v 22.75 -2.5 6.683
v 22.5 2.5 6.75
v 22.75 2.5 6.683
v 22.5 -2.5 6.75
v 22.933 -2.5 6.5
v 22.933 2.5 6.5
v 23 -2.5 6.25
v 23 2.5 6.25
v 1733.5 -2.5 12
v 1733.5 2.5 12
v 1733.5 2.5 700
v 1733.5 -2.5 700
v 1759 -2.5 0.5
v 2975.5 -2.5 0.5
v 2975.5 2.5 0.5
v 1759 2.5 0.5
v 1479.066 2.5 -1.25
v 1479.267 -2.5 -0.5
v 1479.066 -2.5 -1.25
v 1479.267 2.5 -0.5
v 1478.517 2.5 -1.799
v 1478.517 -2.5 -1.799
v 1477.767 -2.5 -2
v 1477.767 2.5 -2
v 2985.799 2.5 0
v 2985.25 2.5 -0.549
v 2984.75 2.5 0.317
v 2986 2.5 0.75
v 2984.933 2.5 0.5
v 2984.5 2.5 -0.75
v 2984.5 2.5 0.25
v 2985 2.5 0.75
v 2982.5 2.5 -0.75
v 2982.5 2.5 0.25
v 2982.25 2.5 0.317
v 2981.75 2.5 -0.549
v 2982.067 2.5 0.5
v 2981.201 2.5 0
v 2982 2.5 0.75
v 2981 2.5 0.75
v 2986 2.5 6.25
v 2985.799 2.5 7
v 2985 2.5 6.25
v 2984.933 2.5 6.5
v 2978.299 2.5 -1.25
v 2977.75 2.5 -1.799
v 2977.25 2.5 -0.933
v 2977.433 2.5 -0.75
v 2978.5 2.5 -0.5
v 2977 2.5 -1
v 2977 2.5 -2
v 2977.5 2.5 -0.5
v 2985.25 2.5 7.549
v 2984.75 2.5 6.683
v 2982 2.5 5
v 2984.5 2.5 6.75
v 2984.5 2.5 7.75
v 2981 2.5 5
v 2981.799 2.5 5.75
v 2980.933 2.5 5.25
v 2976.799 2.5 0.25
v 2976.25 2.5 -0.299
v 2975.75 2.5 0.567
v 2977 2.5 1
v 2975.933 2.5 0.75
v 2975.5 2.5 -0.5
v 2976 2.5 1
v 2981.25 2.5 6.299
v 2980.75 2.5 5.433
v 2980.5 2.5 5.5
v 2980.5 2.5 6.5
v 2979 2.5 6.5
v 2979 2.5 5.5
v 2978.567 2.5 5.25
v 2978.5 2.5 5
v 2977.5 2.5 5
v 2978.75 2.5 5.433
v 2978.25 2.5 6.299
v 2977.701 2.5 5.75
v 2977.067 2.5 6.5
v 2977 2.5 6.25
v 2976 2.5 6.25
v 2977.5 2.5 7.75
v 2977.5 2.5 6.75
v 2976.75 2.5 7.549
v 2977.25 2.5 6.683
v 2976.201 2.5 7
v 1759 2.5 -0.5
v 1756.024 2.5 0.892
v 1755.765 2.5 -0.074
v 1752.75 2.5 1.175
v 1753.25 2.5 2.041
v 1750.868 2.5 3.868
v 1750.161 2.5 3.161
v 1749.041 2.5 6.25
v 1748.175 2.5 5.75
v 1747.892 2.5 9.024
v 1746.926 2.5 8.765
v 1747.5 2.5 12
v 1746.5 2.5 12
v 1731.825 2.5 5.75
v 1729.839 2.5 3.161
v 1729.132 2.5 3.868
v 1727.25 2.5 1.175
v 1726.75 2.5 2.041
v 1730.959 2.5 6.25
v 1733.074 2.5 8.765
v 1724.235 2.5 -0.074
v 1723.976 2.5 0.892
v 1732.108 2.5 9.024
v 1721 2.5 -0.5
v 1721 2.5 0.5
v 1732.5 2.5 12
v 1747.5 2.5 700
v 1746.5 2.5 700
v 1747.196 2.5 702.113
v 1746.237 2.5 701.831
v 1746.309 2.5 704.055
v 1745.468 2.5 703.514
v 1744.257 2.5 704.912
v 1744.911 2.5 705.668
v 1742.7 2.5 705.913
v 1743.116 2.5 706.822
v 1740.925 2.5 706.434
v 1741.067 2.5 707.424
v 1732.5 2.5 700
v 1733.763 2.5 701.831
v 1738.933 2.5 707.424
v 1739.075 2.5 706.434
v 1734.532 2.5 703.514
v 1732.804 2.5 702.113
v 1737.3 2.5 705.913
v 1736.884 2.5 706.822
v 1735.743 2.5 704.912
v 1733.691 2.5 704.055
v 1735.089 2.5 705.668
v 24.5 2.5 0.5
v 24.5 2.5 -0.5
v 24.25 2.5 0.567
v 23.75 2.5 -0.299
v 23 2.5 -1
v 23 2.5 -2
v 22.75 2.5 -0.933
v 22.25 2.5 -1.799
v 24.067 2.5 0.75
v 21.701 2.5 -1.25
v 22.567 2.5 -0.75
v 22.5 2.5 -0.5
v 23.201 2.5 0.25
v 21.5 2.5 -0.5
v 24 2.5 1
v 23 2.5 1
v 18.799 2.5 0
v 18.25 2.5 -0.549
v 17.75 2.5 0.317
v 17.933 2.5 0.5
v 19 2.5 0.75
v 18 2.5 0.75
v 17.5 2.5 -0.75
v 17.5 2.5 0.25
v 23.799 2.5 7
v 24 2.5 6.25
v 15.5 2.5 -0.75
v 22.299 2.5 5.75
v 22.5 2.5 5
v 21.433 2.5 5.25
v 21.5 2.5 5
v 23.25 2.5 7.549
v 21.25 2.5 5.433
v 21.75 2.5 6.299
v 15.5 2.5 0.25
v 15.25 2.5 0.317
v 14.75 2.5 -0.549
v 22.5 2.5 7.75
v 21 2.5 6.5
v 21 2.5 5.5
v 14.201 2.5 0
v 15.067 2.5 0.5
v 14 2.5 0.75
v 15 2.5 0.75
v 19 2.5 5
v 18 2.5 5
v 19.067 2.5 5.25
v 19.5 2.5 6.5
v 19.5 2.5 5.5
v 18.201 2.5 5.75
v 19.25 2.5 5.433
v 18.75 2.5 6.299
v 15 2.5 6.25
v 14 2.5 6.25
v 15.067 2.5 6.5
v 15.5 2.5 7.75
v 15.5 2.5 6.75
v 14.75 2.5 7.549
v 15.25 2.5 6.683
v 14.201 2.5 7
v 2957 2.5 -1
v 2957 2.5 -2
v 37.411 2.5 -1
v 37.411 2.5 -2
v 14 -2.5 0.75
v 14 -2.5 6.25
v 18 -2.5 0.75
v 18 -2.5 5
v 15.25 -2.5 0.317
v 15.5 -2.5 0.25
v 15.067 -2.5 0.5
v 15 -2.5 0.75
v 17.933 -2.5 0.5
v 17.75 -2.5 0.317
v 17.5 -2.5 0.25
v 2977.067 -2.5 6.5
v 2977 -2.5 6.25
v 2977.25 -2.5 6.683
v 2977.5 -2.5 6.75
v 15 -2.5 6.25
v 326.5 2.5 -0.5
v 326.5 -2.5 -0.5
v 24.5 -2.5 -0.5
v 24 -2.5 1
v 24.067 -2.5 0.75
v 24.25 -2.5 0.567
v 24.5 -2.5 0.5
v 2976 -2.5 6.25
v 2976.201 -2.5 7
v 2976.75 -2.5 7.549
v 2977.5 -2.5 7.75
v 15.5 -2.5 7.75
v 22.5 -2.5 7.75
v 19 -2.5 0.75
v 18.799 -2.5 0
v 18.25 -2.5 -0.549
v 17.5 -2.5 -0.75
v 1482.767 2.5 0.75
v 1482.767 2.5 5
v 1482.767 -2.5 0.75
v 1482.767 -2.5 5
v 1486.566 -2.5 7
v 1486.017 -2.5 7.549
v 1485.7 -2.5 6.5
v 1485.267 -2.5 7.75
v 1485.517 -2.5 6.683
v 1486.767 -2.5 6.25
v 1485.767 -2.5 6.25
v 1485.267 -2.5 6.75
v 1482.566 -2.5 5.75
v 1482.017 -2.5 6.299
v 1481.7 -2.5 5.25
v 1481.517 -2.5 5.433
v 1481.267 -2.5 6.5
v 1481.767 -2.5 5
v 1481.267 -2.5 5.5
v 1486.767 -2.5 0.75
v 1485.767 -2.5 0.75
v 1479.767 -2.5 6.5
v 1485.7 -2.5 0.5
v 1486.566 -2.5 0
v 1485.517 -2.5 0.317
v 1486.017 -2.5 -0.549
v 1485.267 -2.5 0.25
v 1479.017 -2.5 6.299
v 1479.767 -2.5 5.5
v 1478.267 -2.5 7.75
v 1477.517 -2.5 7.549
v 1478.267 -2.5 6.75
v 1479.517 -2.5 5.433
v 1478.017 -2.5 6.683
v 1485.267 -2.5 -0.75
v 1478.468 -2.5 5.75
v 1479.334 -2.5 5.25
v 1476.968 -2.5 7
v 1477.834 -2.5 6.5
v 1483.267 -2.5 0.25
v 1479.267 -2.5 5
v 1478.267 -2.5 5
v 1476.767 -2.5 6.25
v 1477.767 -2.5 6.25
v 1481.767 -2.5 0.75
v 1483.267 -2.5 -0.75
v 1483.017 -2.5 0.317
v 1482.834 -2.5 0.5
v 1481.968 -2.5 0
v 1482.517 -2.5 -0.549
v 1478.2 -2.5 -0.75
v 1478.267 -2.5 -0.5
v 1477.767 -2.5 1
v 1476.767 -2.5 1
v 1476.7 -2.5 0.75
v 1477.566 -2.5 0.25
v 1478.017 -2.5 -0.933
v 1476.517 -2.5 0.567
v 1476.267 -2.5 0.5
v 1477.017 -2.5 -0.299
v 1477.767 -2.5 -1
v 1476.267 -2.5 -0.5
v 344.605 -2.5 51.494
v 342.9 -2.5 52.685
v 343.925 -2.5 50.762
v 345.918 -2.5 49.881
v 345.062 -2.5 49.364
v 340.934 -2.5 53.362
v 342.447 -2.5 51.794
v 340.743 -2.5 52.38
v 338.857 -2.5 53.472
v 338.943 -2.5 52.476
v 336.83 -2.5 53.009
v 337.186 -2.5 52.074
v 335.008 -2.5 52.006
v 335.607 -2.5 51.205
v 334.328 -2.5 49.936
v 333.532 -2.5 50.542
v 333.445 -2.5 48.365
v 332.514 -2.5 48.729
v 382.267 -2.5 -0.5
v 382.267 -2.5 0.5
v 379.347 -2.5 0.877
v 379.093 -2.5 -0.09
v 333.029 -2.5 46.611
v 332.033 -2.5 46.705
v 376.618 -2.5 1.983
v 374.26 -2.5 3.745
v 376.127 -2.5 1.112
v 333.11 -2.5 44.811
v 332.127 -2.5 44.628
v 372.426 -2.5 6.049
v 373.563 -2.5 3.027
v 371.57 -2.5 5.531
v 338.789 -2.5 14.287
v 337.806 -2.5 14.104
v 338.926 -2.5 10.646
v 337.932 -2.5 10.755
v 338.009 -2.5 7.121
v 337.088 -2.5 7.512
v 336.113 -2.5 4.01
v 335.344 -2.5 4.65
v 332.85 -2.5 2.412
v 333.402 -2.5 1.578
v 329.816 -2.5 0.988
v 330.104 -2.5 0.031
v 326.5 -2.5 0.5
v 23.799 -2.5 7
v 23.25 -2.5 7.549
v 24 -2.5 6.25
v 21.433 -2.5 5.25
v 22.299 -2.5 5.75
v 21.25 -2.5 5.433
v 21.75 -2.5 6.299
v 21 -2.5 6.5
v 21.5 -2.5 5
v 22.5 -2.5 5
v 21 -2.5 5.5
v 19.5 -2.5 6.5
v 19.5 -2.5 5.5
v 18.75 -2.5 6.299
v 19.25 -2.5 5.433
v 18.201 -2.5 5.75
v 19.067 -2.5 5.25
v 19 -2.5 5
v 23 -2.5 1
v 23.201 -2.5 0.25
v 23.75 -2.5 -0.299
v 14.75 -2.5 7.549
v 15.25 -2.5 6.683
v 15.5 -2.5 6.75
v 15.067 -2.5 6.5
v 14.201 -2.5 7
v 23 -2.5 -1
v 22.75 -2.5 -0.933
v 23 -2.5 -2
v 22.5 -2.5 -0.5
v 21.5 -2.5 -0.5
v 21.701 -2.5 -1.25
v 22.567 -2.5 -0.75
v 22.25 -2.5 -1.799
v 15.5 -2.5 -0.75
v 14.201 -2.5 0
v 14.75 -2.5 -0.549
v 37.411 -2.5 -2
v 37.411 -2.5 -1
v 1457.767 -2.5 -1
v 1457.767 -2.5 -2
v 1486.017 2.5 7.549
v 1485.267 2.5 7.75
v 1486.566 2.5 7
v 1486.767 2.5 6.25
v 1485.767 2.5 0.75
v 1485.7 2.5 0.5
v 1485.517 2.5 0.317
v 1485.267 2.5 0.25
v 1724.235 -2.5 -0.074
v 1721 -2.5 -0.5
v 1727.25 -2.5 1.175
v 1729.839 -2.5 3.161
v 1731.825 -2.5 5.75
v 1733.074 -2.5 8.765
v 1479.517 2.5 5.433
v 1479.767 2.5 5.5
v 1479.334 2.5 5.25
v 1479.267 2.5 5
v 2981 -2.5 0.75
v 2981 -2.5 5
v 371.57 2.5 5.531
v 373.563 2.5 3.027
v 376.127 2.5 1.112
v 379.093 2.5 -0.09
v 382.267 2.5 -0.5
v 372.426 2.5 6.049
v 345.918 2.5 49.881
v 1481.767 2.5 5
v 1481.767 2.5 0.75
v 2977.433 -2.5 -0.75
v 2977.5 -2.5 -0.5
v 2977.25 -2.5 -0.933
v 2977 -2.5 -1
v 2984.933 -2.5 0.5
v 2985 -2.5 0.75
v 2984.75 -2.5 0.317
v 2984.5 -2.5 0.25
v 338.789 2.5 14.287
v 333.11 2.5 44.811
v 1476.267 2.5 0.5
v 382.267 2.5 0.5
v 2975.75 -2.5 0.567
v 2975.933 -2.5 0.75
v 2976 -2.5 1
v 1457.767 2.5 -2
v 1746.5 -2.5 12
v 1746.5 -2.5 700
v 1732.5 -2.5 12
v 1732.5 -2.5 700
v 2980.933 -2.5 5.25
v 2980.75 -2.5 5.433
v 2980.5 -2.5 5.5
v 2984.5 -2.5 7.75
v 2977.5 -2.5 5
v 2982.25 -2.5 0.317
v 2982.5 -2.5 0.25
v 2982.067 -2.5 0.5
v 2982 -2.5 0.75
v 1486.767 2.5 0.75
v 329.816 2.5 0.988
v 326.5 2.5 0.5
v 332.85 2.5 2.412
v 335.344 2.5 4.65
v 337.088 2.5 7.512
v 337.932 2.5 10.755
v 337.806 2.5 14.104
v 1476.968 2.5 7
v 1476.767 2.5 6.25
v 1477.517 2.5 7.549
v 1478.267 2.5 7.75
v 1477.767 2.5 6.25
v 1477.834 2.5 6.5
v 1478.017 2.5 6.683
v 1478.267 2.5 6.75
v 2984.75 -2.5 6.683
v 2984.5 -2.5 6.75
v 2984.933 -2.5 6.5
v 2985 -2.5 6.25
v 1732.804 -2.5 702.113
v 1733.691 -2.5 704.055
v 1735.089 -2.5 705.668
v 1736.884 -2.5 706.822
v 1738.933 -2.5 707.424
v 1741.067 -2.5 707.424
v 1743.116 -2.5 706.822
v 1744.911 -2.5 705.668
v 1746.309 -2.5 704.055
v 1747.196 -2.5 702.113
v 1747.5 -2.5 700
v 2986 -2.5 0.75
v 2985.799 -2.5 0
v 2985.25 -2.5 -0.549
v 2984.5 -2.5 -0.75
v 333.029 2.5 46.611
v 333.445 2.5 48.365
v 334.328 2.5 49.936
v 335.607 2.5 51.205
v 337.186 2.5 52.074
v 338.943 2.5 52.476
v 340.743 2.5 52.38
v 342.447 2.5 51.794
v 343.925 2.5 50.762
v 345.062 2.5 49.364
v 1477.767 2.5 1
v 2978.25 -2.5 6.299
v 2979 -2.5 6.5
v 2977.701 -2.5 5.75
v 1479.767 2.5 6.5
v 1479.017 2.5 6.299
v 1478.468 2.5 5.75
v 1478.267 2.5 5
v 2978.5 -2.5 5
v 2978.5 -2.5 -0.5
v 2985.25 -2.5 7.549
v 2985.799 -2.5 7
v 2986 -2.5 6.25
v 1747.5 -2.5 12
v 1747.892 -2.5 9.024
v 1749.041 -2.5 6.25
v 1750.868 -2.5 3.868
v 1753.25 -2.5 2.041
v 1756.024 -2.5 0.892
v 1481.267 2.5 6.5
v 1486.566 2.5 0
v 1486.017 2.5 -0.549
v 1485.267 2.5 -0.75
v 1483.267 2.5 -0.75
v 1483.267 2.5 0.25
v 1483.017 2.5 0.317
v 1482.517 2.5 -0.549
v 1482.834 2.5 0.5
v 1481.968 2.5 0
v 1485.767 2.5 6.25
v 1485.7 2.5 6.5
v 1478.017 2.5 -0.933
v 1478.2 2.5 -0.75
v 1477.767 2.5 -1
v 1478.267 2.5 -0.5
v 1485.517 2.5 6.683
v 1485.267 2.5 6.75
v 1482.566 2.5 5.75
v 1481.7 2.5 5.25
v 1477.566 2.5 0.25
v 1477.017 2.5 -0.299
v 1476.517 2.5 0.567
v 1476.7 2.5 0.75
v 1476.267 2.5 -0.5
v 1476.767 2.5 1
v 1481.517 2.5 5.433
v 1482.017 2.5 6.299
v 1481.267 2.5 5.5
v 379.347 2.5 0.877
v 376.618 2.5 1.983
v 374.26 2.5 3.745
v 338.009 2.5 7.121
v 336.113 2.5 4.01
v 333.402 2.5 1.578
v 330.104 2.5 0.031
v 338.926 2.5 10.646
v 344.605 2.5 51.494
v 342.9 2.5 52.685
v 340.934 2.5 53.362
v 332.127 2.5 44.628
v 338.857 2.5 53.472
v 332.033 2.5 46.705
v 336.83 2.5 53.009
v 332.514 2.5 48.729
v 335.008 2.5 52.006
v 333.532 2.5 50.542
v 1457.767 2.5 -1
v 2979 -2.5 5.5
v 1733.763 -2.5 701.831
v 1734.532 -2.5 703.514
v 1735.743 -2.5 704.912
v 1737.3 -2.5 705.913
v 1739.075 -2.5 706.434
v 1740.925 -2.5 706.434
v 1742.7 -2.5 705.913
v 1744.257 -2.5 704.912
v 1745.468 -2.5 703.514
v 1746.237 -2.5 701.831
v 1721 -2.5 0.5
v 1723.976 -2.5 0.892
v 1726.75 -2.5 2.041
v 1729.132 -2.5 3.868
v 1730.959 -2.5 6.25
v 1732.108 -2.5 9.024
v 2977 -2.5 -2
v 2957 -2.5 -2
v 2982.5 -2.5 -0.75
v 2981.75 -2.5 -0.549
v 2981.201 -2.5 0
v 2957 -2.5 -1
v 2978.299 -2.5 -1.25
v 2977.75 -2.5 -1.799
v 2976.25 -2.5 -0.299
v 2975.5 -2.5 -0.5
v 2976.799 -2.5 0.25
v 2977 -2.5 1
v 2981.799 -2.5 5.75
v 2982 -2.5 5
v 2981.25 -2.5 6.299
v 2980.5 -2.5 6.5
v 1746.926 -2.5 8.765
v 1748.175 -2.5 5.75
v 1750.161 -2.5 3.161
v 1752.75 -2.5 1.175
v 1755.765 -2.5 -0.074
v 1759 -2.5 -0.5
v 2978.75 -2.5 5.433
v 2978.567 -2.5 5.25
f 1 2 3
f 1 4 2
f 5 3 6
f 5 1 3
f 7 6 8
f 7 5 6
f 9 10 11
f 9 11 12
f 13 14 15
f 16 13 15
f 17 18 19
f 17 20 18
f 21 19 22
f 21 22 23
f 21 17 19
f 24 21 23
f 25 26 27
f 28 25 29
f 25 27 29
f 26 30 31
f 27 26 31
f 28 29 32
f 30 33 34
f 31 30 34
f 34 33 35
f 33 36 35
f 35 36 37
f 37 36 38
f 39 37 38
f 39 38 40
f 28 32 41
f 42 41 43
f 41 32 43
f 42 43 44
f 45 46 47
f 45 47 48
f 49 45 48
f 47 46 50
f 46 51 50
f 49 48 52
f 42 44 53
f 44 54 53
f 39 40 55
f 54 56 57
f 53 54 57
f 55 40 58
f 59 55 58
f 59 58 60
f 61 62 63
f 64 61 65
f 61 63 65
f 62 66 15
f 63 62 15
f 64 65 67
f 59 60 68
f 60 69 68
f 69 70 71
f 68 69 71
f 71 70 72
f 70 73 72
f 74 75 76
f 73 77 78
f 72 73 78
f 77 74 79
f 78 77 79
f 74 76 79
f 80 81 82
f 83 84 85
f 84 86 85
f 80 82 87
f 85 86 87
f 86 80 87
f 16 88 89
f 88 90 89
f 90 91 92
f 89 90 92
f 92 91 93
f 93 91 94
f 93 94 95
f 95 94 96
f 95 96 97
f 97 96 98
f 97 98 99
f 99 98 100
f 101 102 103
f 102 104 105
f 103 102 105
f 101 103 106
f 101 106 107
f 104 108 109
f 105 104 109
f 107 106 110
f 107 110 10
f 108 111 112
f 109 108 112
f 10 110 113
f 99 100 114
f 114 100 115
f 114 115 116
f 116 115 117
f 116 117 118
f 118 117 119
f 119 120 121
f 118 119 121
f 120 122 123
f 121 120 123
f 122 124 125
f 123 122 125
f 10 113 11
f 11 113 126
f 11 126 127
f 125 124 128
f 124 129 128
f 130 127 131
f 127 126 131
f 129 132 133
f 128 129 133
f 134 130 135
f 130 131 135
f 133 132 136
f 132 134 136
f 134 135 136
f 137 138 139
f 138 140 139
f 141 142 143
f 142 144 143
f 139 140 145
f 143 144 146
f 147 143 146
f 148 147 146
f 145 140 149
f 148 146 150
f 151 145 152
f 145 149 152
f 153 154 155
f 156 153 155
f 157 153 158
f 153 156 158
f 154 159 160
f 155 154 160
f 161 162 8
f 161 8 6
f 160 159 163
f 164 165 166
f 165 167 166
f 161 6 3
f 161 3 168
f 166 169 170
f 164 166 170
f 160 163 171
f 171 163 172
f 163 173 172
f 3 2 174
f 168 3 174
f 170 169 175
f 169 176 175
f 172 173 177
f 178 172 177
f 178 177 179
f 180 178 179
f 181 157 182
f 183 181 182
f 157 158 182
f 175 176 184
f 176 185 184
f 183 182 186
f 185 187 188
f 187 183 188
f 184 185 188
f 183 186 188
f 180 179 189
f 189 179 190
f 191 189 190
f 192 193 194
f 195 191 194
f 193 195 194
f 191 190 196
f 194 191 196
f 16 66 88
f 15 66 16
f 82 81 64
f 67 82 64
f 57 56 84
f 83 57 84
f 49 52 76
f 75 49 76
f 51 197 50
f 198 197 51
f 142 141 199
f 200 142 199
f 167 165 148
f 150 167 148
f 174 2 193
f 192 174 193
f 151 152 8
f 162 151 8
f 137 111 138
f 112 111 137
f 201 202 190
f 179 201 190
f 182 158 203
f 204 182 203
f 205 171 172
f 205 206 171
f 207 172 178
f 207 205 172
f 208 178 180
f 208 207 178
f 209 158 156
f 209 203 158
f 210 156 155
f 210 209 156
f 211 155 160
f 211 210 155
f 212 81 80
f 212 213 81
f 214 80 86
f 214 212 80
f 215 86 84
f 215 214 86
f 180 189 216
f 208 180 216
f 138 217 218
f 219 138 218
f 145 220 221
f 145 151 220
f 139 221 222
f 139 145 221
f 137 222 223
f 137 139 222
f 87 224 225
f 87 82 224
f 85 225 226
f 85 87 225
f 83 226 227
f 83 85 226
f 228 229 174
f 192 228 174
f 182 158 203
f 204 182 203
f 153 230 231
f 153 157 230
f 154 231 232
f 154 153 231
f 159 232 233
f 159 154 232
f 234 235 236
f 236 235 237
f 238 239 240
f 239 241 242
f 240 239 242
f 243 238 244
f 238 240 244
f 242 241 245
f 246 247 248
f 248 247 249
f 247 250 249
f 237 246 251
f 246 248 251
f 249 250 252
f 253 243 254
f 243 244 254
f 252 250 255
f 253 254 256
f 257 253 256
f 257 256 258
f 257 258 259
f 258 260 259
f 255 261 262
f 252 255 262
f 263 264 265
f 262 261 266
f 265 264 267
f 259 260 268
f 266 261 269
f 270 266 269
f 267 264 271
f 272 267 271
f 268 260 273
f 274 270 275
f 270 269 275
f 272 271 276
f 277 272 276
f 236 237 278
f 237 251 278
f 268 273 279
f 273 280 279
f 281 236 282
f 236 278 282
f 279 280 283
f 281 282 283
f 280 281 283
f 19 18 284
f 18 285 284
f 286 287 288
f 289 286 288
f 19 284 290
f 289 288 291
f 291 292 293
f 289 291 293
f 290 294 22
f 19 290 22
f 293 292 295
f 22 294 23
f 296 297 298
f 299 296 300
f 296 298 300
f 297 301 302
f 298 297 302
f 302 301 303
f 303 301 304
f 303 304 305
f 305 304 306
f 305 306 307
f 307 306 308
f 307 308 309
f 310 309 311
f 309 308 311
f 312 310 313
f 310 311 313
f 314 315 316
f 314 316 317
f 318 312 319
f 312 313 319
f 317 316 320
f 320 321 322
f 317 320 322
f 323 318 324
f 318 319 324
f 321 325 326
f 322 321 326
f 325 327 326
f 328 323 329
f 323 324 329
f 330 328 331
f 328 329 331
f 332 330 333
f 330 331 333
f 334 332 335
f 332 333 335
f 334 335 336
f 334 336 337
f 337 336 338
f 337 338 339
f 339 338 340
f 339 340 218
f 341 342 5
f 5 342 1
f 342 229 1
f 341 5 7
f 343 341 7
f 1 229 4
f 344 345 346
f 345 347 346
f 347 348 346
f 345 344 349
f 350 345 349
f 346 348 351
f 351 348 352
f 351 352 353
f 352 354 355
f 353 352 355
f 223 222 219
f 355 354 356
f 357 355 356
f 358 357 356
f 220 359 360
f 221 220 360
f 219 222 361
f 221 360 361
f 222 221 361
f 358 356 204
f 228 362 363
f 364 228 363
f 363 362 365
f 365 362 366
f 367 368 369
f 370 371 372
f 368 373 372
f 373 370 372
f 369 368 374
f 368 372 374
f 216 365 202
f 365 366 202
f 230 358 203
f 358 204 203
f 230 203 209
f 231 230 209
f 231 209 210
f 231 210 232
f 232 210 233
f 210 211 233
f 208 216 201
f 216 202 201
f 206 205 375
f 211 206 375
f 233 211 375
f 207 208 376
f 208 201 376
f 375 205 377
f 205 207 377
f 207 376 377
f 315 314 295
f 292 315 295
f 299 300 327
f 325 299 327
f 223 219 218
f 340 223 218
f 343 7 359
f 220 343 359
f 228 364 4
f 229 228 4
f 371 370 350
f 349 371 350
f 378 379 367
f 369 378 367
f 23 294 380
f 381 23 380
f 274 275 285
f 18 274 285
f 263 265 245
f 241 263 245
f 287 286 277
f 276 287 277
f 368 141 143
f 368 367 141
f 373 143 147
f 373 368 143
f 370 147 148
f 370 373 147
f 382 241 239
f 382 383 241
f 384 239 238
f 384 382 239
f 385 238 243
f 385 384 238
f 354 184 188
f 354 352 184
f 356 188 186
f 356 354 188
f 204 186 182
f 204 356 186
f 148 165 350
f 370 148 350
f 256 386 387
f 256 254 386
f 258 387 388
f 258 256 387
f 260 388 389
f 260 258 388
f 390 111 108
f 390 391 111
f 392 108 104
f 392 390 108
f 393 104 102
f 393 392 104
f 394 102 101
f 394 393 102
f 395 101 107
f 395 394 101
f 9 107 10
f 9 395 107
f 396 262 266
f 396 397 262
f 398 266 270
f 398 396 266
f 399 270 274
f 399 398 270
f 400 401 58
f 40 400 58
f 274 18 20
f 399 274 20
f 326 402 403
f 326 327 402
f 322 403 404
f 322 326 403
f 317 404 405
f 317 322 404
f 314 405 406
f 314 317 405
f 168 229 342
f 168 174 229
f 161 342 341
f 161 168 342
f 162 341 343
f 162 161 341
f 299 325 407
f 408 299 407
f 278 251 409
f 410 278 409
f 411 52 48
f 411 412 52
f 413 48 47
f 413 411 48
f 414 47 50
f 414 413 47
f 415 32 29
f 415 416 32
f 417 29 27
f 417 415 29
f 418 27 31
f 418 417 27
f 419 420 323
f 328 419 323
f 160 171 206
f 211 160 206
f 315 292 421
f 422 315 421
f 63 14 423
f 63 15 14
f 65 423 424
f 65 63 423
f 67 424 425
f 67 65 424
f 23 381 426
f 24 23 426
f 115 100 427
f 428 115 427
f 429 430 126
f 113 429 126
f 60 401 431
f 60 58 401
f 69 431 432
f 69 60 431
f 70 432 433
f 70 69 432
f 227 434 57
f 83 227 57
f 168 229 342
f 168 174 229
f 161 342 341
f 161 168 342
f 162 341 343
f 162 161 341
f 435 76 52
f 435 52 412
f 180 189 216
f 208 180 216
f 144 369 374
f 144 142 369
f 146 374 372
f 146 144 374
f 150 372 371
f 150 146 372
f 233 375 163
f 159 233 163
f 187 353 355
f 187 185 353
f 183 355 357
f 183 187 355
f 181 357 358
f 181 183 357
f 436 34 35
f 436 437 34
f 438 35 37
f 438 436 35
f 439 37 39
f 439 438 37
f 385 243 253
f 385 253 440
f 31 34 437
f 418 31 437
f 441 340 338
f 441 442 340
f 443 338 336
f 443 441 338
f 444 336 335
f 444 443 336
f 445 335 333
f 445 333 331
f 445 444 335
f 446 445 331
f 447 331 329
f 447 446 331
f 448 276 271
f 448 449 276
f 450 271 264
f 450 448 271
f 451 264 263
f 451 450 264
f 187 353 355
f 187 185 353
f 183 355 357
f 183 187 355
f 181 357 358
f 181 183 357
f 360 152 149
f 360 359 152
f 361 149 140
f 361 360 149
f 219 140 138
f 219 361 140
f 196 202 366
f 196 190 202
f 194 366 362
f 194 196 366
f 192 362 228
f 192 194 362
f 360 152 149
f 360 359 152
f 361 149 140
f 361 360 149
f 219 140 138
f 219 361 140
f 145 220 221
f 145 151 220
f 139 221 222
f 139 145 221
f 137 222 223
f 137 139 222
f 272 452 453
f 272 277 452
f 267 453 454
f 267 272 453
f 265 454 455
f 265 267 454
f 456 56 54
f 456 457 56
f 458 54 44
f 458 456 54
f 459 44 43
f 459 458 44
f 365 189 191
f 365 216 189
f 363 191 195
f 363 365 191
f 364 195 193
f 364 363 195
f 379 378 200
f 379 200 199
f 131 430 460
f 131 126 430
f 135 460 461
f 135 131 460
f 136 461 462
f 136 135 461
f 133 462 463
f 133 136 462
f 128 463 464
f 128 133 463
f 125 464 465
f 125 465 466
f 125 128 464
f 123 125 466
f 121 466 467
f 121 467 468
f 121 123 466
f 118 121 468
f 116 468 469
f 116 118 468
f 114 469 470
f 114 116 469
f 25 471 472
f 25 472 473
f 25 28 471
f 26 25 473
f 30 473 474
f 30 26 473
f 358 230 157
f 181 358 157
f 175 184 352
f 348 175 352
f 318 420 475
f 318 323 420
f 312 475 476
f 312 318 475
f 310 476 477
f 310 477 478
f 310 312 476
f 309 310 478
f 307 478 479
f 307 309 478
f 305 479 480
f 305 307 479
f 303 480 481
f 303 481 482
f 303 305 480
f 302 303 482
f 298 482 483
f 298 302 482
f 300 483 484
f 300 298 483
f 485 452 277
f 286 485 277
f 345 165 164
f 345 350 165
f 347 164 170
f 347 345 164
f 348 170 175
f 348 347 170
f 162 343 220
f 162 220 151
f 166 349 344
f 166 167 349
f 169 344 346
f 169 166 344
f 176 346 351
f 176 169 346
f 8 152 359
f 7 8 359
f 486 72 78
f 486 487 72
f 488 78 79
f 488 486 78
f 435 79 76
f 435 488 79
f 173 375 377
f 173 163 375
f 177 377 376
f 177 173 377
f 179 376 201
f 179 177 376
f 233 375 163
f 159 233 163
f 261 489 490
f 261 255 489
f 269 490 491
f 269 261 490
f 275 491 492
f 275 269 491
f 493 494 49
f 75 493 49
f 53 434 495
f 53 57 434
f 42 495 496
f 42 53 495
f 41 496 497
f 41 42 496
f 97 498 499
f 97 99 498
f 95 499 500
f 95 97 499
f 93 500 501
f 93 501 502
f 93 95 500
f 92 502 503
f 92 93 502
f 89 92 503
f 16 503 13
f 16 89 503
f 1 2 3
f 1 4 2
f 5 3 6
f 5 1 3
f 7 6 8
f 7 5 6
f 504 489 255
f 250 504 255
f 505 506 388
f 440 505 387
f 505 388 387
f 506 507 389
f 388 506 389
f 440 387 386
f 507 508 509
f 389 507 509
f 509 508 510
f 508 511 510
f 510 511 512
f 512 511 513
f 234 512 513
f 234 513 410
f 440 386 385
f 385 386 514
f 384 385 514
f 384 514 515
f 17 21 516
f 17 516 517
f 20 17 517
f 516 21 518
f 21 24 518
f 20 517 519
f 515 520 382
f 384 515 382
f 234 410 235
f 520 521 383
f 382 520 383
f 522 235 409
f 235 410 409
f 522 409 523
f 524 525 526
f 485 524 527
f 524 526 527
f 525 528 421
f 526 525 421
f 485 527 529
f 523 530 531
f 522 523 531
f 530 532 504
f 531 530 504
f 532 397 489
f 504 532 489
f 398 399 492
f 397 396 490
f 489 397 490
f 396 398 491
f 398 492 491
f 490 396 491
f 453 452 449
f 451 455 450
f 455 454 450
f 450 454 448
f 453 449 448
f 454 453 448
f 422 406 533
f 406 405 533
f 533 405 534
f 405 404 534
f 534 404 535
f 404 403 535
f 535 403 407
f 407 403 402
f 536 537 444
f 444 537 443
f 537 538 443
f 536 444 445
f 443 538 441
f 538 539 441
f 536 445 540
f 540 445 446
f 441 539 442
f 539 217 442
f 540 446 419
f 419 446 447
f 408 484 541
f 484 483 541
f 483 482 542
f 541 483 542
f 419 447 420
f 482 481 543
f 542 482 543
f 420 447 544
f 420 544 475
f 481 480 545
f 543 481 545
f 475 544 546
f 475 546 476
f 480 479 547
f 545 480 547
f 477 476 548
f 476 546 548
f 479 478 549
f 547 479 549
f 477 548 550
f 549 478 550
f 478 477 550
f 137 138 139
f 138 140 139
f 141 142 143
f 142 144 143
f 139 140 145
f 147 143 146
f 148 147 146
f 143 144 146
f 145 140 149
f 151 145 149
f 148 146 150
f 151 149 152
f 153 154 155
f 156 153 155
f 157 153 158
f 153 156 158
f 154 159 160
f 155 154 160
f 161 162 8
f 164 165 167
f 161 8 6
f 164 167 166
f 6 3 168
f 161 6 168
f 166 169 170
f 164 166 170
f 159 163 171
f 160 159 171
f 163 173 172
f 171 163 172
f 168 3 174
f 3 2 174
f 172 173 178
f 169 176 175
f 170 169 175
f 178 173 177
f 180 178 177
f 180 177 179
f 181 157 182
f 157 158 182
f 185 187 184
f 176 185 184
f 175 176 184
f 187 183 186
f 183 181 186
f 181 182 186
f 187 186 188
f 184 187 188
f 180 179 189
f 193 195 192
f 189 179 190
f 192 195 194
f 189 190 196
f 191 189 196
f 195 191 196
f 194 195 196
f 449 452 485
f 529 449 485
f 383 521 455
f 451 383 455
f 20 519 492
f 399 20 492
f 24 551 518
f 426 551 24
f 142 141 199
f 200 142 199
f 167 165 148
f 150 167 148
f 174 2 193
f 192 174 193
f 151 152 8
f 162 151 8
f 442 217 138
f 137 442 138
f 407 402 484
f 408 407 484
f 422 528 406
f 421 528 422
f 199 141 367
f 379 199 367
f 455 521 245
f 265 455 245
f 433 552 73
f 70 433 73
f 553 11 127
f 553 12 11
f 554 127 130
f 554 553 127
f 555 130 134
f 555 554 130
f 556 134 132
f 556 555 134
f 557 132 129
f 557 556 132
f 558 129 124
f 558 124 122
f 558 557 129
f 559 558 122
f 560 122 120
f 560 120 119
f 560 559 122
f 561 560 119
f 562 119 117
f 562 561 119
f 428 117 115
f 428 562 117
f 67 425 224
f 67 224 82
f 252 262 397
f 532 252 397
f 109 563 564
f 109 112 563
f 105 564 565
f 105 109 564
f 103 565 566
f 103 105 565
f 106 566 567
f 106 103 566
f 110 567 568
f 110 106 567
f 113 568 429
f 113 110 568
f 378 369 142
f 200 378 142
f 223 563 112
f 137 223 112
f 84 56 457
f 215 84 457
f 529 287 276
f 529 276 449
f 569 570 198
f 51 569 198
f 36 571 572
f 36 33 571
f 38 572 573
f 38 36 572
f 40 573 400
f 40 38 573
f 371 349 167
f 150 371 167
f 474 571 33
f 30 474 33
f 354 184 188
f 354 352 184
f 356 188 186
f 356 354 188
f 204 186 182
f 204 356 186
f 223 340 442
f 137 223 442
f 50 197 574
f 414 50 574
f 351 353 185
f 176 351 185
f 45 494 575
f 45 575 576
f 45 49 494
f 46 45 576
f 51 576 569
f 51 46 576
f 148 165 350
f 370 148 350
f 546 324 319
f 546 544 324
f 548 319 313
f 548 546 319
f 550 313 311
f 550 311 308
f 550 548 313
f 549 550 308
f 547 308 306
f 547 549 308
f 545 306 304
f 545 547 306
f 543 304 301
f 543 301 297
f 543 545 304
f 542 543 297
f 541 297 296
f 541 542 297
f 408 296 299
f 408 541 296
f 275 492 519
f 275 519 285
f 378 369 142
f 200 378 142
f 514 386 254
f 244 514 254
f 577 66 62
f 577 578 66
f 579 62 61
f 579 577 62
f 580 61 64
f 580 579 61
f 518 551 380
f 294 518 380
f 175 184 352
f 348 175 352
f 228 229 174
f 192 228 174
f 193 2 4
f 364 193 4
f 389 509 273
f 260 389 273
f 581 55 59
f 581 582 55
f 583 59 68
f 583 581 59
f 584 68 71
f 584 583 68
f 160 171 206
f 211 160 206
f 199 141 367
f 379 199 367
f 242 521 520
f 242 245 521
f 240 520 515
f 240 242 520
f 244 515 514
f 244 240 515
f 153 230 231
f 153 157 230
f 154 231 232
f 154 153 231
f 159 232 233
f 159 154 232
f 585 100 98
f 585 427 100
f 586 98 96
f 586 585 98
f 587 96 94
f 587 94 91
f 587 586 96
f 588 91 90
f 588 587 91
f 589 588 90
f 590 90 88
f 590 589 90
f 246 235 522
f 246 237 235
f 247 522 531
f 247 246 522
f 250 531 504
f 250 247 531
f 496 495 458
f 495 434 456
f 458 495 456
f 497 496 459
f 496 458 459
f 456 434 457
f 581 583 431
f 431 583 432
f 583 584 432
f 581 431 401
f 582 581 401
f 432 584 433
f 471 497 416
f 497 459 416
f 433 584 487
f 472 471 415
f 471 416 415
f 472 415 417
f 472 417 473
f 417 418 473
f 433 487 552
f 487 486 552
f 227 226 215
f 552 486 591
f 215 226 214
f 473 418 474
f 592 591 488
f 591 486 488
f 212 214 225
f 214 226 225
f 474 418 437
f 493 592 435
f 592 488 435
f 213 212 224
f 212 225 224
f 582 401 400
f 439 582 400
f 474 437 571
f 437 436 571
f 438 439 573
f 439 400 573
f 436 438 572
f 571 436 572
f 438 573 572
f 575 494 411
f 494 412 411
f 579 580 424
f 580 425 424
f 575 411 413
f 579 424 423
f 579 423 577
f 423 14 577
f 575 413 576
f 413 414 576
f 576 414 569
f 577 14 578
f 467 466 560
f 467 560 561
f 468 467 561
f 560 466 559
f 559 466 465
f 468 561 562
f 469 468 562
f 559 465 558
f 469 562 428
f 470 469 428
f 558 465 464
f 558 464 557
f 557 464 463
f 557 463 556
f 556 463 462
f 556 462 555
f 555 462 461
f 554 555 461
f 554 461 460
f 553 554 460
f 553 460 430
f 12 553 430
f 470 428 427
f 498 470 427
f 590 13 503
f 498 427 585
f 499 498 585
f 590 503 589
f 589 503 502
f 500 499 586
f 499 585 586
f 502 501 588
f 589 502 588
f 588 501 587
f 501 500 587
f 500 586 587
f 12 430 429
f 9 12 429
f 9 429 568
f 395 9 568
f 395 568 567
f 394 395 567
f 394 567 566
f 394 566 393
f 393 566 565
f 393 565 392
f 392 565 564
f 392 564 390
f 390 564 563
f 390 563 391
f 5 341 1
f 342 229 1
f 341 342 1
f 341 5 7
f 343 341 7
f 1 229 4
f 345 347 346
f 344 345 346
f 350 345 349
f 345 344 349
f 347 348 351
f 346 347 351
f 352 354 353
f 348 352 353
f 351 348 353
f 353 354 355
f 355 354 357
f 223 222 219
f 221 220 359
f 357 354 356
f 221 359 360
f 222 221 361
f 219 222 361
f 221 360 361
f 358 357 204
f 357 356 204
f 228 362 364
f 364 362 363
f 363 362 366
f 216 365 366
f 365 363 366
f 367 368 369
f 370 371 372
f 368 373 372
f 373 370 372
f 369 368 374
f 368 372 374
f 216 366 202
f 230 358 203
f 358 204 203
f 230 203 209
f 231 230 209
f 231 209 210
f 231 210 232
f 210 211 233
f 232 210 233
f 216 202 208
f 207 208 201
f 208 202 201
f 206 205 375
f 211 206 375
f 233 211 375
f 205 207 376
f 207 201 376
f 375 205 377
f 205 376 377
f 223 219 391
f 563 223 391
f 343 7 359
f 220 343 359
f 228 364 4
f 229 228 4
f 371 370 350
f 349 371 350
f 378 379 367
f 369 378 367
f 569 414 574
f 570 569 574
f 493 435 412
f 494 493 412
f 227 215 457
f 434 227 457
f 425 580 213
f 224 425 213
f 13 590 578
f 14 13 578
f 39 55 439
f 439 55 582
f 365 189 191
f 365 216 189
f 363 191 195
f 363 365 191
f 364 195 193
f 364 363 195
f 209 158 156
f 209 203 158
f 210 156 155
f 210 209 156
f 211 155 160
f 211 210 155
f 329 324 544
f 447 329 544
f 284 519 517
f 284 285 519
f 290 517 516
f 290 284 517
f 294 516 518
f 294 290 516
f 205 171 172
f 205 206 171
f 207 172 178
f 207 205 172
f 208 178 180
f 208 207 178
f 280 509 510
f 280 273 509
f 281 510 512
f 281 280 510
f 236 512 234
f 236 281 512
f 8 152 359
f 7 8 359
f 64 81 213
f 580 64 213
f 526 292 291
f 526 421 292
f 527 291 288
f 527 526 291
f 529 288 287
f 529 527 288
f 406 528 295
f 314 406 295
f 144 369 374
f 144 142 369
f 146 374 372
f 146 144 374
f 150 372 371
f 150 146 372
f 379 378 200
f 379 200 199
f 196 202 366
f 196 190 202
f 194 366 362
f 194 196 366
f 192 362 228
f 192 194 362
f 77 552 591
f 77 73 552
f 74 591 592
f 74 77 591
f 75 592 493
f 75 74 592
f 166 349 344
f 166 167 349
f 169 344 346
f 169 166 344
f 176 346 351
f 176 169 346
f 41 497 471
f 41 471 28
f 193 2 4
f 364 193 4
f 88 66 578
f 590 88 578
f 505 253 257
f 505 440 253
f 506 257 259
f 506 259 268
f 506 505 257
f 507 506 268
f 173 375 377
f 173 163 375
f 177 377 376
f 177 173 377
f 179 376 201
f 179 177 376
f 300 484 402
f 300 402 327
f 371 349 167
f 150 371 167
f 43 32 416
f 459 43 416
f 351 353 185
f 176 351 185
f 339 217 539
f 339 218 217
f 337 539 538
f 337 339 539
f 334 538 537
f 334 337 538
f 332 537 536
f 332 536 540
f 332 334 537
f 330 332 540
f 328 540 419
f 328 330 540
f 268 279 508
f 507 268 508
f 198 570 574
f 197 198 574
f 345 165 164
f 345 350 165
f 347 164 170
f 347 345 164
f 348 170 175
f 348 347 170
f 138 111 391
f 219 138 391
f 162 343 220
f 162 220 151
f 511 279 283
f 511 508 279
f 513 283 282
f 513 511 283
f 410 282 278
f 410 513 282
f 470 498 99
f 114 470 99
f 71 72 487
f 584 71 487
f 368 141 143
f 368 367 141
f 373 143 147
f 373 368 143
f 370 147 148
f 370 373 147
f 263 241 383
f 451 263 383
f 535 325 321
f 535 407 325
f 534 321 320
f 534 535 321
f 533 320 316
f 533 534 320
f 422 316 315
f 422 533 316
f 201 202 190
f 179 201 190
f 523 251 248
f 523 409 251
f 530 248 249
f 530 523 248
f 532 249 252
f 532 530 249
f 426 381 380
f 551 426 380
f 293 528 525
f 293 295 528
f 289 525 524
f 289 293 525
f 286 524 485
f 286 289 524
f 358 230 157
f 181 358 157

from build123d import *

# Parameters (mm, degrees)
F2_W = 5
F2_H = 1


with BuildPart() as f3:
    # F3: sweep along a path in F0
    with BuildLine(Plane.XZ) as f3_path:
        Line((37.4110606218, -1.5), (23, -1.5))
        ThreePointArc((23, -1.5), (22.2928932188, -1.2071067812), (22, -0.5))
        Line((22, -0.5), (22, 5))
        ThreePointArc((22, 5), (21.7071067812, 5.7071067812), (21, 6))
        Line((21, 6), (19.5, 6))
        ThreePointArc((19.5, 6), (18.7928932188, 5.7071067812), (18.5, 5))
        Line((18.5, 5), (18.5, 0.75))
        ThreePointArc((18.5, 0.75), (18.2071067812, 0.0428932188), (17.5, -0.25))
        Line((17.5, -0.25), (15.5, -0.25))
        ThreePointArc((15.5, -0.25), (14.7928932188, 0.0428932188), (14.5, 0.75))
        Line((14.5, 0.75), (14.5, 6.25))
        ThreePointArc((14.5, 6.25), (14.7928932188, 6.9571067812), (15.5, 7.25))
        Line((15.5, 7.25), (22.5, 7.25))
        ThreePointArc((22.5, 7.25), (23.2071067812, 6.9571067812), (23.5, 6.25))
        Line((23.5, 6.25), (23.5, 1))
        ThreePointArc((23.5, 1), (23.7928932188, 0.2928932188), (24.5, 0))
        Line((24.5, 0), (1721, 0))
        ThreePointArc((1721, 0), (1729.4852813742, 3.5147186258), (1733, 12))
        Line((1733, 12), (1733, 700))
        ThreePointArc((1733, 700), (1740, 707), (1747, 700))
        Line((1747, 700), (1747, 12))
        ThreePointArc((1747, 12), (1750.5147186258, 3.5147186258), (1759, 0))
        Line((1759, 0), (2975.5, 0))
        ThreePointArc((2975.5, 0), (2976.2071067812, 0.2928932188), (2976.5, 1))
        Line((2976.5, 1), (2976.5, 6.25))
        ThreePointArc((2976.5, 6.25), (2976.7928932188, 6.9571067812), (2977.5, 7.25))
        Line((2977.5, 7.25), (2984.5, 7.25))
        ThreePointArc((2984.5, 7.25), (2985.2071067812, 6.9571067812), (2985.5, 6.25))
        Line((2985.5, 6.25), (2985.5, 0.75))
        ThreePointArc((2985.5, 0.75), (2985.2071067812, 0.0428932188), (2984.5, -0.25))
        Line((2984.5, -0.25), (2982.5, -0.25))
        ThreePointArc((2982.5, -0.25), (2981.7928932188, 0.0428932188), (2981.5, 0.75))
        Line((2981.5, 0.75), (2981.5, 5))
        ThreePointArc((2981.5, 5), (2981.2071067812, 5.7071067812), (2980.5, 6))
        Line((2980.5, 6), (2979, 6))
        ThreePointArc((2979, 6), (2978.2928932188, 5.7071067812), (2978, 5))
        Line((2978, 5), (2978, -0.5))
        ThreePointArc((2978, -0.5), (2977.7071067812, -1.2071067812), (2977, -1.5))
        Line((2977, -1.5), (2957, -1.5))
    # F2 (on plane+point) → F3 (sweep)
    with BuildSketch(Plane.YZ.offset(37.4110606218)):
        with Locations((0, -1.5)):
            Rectangle(F2_W, F2_H)
    sweep(path=f3_path.line)


with BuildPart() as f5:
    # F5: sweep along a path in F4
    with BuildLine(Plane.XZ) as f5_path:
        Line((37.4110606218, -1.5), (23, -1.5))
        ThreePointArc((23, -1.5), (22.2928932188, -1.2071067812), (22, -0.5))
        Line((22, -0.5), (22, 5))
        ThreePointArc((22, 5), (21.7071067812, 5.7071067812), (21, 6))
        Line((21, 6), (19.5, 6))
        ThreePointArc((19.5, 6), (18.7928932188, 5.7071067812), (18.5, 5))
        Line((18.5, 5), (18.5, 0.75))
        ThreePointArc((18.5, 0.75), (18.2071067812, 0.0428932188), (17.5, -0.25))
        Line((17.5, -0.25), (15.5, -0.25))
        ThreePointArc((15.5, -0.25), (14.7928932188, 0.0428932188), (14.5, 0.75))
        Line((14.5, 0.75), (14.5, 6.25))
        ThreePointArc((14.5, 6.25), (14.7928932188, 6.9571067812), (15.5, 7.25))
        Line((15.5, 7.25), (22.5, 7.25))
        ThreePointArc((22.5, 7.25), (23.2071067812, 6.9571067812), (23.5, 6.25))
        Line((23.5, 6.25), (23.5, 1))
        ThreePointArc((23.5, 1), (23.7928932188, 0.2928932188), (24.5, 0))
        Line((24.5, 0), (326.5, 0))
        ThreePointArc((326.5, 0), (335.7287796355, 4.3299526443), (338.2975294733, 14.1950622602))
        Line((338.2975294733, 14.1950622602), (332.6181078072, 44.7195470149))
        ThreePointArc((332.6181078072, 44.7195470149), (337.0082961184, 52.5415144857), (345.4898077174, 49.6224582136))
        Line((345.4898077174, 49.6224582136), (371.998336251, 5.7900716339))
        ThreePointArc((371.998336251, 5.7900716339), (376.3724767803, 1.5472697252), (382.2665780522, 0))
        Line((382.2665780522, 0), (1476.2665780522, 0))
        ThreePointArc((1476.2665780522, 0), (1476.9736848334, 0.2928932188), (1477.2665780522, 1))
        Line((1477.2665780522, 1), (1477.2665780522, 6.25))
        ThreePointArc((1477.2665780522, 6.25), (1477.559471271, 6.9571067812), (1478.2665780522, 7.25))
        Line((1478.2665780522, 7.25), (1485.2665780522, 7.25))
        ThreePointArc((1485.2665780522, 7.25), (1485.9736848334, 6.9571067812), (1486.2665780522, 6.25))
        Line((1486.2665780522, 6.25), (1486.2665780522, 0.75))
        ThreePointArc((1486.2665780522, 0.75), (1485.9736848334, 0.0428932188), (1485.2665780522, -0.25))
        Line((1485.2665780522, -0.25), (1483.2665780522, -0.25))
        ThreePointArc((1483.2665780522, -0.25), (1482.559471271, 0.0428932188), (1482.2665780522, 0.75))
        Line((1482.2665780522, 0.75), (1482.2665780522, 5))
        ThreePointArc((1482.2665780522, 5), (1481.9736848334, 5.7071067812), (1481.2665780522, 6))
        Line((1481.2665780522, 6), (1479.7665780522, 6))
        ThreePointArc((1479.7665780522, 6), (1479.059471271, 5.7071067812), (1478.7665780522, 5))
        Line((1478.7665780522, 5), (1478.7665780522, -0.5))
        ThreePointArc((1478.7665780522, -0.5), (1478.4736848334, -1.2071067812), (1477.7665780522, -1.5))
        Line((1477.7665780522, -1.5), (1457.7665780522, -1.5))
    # F2 (on plane+point) → F5 (sweep)
    with BuildSketch(Plane.YZ.offset(37.4110606218)):
        with Locations((0, -1.5)):
            Rectangle(F2_W, F2_H)
    sweep(path=f5_path.line)


solid = Compound([f3.part, f5.part])
